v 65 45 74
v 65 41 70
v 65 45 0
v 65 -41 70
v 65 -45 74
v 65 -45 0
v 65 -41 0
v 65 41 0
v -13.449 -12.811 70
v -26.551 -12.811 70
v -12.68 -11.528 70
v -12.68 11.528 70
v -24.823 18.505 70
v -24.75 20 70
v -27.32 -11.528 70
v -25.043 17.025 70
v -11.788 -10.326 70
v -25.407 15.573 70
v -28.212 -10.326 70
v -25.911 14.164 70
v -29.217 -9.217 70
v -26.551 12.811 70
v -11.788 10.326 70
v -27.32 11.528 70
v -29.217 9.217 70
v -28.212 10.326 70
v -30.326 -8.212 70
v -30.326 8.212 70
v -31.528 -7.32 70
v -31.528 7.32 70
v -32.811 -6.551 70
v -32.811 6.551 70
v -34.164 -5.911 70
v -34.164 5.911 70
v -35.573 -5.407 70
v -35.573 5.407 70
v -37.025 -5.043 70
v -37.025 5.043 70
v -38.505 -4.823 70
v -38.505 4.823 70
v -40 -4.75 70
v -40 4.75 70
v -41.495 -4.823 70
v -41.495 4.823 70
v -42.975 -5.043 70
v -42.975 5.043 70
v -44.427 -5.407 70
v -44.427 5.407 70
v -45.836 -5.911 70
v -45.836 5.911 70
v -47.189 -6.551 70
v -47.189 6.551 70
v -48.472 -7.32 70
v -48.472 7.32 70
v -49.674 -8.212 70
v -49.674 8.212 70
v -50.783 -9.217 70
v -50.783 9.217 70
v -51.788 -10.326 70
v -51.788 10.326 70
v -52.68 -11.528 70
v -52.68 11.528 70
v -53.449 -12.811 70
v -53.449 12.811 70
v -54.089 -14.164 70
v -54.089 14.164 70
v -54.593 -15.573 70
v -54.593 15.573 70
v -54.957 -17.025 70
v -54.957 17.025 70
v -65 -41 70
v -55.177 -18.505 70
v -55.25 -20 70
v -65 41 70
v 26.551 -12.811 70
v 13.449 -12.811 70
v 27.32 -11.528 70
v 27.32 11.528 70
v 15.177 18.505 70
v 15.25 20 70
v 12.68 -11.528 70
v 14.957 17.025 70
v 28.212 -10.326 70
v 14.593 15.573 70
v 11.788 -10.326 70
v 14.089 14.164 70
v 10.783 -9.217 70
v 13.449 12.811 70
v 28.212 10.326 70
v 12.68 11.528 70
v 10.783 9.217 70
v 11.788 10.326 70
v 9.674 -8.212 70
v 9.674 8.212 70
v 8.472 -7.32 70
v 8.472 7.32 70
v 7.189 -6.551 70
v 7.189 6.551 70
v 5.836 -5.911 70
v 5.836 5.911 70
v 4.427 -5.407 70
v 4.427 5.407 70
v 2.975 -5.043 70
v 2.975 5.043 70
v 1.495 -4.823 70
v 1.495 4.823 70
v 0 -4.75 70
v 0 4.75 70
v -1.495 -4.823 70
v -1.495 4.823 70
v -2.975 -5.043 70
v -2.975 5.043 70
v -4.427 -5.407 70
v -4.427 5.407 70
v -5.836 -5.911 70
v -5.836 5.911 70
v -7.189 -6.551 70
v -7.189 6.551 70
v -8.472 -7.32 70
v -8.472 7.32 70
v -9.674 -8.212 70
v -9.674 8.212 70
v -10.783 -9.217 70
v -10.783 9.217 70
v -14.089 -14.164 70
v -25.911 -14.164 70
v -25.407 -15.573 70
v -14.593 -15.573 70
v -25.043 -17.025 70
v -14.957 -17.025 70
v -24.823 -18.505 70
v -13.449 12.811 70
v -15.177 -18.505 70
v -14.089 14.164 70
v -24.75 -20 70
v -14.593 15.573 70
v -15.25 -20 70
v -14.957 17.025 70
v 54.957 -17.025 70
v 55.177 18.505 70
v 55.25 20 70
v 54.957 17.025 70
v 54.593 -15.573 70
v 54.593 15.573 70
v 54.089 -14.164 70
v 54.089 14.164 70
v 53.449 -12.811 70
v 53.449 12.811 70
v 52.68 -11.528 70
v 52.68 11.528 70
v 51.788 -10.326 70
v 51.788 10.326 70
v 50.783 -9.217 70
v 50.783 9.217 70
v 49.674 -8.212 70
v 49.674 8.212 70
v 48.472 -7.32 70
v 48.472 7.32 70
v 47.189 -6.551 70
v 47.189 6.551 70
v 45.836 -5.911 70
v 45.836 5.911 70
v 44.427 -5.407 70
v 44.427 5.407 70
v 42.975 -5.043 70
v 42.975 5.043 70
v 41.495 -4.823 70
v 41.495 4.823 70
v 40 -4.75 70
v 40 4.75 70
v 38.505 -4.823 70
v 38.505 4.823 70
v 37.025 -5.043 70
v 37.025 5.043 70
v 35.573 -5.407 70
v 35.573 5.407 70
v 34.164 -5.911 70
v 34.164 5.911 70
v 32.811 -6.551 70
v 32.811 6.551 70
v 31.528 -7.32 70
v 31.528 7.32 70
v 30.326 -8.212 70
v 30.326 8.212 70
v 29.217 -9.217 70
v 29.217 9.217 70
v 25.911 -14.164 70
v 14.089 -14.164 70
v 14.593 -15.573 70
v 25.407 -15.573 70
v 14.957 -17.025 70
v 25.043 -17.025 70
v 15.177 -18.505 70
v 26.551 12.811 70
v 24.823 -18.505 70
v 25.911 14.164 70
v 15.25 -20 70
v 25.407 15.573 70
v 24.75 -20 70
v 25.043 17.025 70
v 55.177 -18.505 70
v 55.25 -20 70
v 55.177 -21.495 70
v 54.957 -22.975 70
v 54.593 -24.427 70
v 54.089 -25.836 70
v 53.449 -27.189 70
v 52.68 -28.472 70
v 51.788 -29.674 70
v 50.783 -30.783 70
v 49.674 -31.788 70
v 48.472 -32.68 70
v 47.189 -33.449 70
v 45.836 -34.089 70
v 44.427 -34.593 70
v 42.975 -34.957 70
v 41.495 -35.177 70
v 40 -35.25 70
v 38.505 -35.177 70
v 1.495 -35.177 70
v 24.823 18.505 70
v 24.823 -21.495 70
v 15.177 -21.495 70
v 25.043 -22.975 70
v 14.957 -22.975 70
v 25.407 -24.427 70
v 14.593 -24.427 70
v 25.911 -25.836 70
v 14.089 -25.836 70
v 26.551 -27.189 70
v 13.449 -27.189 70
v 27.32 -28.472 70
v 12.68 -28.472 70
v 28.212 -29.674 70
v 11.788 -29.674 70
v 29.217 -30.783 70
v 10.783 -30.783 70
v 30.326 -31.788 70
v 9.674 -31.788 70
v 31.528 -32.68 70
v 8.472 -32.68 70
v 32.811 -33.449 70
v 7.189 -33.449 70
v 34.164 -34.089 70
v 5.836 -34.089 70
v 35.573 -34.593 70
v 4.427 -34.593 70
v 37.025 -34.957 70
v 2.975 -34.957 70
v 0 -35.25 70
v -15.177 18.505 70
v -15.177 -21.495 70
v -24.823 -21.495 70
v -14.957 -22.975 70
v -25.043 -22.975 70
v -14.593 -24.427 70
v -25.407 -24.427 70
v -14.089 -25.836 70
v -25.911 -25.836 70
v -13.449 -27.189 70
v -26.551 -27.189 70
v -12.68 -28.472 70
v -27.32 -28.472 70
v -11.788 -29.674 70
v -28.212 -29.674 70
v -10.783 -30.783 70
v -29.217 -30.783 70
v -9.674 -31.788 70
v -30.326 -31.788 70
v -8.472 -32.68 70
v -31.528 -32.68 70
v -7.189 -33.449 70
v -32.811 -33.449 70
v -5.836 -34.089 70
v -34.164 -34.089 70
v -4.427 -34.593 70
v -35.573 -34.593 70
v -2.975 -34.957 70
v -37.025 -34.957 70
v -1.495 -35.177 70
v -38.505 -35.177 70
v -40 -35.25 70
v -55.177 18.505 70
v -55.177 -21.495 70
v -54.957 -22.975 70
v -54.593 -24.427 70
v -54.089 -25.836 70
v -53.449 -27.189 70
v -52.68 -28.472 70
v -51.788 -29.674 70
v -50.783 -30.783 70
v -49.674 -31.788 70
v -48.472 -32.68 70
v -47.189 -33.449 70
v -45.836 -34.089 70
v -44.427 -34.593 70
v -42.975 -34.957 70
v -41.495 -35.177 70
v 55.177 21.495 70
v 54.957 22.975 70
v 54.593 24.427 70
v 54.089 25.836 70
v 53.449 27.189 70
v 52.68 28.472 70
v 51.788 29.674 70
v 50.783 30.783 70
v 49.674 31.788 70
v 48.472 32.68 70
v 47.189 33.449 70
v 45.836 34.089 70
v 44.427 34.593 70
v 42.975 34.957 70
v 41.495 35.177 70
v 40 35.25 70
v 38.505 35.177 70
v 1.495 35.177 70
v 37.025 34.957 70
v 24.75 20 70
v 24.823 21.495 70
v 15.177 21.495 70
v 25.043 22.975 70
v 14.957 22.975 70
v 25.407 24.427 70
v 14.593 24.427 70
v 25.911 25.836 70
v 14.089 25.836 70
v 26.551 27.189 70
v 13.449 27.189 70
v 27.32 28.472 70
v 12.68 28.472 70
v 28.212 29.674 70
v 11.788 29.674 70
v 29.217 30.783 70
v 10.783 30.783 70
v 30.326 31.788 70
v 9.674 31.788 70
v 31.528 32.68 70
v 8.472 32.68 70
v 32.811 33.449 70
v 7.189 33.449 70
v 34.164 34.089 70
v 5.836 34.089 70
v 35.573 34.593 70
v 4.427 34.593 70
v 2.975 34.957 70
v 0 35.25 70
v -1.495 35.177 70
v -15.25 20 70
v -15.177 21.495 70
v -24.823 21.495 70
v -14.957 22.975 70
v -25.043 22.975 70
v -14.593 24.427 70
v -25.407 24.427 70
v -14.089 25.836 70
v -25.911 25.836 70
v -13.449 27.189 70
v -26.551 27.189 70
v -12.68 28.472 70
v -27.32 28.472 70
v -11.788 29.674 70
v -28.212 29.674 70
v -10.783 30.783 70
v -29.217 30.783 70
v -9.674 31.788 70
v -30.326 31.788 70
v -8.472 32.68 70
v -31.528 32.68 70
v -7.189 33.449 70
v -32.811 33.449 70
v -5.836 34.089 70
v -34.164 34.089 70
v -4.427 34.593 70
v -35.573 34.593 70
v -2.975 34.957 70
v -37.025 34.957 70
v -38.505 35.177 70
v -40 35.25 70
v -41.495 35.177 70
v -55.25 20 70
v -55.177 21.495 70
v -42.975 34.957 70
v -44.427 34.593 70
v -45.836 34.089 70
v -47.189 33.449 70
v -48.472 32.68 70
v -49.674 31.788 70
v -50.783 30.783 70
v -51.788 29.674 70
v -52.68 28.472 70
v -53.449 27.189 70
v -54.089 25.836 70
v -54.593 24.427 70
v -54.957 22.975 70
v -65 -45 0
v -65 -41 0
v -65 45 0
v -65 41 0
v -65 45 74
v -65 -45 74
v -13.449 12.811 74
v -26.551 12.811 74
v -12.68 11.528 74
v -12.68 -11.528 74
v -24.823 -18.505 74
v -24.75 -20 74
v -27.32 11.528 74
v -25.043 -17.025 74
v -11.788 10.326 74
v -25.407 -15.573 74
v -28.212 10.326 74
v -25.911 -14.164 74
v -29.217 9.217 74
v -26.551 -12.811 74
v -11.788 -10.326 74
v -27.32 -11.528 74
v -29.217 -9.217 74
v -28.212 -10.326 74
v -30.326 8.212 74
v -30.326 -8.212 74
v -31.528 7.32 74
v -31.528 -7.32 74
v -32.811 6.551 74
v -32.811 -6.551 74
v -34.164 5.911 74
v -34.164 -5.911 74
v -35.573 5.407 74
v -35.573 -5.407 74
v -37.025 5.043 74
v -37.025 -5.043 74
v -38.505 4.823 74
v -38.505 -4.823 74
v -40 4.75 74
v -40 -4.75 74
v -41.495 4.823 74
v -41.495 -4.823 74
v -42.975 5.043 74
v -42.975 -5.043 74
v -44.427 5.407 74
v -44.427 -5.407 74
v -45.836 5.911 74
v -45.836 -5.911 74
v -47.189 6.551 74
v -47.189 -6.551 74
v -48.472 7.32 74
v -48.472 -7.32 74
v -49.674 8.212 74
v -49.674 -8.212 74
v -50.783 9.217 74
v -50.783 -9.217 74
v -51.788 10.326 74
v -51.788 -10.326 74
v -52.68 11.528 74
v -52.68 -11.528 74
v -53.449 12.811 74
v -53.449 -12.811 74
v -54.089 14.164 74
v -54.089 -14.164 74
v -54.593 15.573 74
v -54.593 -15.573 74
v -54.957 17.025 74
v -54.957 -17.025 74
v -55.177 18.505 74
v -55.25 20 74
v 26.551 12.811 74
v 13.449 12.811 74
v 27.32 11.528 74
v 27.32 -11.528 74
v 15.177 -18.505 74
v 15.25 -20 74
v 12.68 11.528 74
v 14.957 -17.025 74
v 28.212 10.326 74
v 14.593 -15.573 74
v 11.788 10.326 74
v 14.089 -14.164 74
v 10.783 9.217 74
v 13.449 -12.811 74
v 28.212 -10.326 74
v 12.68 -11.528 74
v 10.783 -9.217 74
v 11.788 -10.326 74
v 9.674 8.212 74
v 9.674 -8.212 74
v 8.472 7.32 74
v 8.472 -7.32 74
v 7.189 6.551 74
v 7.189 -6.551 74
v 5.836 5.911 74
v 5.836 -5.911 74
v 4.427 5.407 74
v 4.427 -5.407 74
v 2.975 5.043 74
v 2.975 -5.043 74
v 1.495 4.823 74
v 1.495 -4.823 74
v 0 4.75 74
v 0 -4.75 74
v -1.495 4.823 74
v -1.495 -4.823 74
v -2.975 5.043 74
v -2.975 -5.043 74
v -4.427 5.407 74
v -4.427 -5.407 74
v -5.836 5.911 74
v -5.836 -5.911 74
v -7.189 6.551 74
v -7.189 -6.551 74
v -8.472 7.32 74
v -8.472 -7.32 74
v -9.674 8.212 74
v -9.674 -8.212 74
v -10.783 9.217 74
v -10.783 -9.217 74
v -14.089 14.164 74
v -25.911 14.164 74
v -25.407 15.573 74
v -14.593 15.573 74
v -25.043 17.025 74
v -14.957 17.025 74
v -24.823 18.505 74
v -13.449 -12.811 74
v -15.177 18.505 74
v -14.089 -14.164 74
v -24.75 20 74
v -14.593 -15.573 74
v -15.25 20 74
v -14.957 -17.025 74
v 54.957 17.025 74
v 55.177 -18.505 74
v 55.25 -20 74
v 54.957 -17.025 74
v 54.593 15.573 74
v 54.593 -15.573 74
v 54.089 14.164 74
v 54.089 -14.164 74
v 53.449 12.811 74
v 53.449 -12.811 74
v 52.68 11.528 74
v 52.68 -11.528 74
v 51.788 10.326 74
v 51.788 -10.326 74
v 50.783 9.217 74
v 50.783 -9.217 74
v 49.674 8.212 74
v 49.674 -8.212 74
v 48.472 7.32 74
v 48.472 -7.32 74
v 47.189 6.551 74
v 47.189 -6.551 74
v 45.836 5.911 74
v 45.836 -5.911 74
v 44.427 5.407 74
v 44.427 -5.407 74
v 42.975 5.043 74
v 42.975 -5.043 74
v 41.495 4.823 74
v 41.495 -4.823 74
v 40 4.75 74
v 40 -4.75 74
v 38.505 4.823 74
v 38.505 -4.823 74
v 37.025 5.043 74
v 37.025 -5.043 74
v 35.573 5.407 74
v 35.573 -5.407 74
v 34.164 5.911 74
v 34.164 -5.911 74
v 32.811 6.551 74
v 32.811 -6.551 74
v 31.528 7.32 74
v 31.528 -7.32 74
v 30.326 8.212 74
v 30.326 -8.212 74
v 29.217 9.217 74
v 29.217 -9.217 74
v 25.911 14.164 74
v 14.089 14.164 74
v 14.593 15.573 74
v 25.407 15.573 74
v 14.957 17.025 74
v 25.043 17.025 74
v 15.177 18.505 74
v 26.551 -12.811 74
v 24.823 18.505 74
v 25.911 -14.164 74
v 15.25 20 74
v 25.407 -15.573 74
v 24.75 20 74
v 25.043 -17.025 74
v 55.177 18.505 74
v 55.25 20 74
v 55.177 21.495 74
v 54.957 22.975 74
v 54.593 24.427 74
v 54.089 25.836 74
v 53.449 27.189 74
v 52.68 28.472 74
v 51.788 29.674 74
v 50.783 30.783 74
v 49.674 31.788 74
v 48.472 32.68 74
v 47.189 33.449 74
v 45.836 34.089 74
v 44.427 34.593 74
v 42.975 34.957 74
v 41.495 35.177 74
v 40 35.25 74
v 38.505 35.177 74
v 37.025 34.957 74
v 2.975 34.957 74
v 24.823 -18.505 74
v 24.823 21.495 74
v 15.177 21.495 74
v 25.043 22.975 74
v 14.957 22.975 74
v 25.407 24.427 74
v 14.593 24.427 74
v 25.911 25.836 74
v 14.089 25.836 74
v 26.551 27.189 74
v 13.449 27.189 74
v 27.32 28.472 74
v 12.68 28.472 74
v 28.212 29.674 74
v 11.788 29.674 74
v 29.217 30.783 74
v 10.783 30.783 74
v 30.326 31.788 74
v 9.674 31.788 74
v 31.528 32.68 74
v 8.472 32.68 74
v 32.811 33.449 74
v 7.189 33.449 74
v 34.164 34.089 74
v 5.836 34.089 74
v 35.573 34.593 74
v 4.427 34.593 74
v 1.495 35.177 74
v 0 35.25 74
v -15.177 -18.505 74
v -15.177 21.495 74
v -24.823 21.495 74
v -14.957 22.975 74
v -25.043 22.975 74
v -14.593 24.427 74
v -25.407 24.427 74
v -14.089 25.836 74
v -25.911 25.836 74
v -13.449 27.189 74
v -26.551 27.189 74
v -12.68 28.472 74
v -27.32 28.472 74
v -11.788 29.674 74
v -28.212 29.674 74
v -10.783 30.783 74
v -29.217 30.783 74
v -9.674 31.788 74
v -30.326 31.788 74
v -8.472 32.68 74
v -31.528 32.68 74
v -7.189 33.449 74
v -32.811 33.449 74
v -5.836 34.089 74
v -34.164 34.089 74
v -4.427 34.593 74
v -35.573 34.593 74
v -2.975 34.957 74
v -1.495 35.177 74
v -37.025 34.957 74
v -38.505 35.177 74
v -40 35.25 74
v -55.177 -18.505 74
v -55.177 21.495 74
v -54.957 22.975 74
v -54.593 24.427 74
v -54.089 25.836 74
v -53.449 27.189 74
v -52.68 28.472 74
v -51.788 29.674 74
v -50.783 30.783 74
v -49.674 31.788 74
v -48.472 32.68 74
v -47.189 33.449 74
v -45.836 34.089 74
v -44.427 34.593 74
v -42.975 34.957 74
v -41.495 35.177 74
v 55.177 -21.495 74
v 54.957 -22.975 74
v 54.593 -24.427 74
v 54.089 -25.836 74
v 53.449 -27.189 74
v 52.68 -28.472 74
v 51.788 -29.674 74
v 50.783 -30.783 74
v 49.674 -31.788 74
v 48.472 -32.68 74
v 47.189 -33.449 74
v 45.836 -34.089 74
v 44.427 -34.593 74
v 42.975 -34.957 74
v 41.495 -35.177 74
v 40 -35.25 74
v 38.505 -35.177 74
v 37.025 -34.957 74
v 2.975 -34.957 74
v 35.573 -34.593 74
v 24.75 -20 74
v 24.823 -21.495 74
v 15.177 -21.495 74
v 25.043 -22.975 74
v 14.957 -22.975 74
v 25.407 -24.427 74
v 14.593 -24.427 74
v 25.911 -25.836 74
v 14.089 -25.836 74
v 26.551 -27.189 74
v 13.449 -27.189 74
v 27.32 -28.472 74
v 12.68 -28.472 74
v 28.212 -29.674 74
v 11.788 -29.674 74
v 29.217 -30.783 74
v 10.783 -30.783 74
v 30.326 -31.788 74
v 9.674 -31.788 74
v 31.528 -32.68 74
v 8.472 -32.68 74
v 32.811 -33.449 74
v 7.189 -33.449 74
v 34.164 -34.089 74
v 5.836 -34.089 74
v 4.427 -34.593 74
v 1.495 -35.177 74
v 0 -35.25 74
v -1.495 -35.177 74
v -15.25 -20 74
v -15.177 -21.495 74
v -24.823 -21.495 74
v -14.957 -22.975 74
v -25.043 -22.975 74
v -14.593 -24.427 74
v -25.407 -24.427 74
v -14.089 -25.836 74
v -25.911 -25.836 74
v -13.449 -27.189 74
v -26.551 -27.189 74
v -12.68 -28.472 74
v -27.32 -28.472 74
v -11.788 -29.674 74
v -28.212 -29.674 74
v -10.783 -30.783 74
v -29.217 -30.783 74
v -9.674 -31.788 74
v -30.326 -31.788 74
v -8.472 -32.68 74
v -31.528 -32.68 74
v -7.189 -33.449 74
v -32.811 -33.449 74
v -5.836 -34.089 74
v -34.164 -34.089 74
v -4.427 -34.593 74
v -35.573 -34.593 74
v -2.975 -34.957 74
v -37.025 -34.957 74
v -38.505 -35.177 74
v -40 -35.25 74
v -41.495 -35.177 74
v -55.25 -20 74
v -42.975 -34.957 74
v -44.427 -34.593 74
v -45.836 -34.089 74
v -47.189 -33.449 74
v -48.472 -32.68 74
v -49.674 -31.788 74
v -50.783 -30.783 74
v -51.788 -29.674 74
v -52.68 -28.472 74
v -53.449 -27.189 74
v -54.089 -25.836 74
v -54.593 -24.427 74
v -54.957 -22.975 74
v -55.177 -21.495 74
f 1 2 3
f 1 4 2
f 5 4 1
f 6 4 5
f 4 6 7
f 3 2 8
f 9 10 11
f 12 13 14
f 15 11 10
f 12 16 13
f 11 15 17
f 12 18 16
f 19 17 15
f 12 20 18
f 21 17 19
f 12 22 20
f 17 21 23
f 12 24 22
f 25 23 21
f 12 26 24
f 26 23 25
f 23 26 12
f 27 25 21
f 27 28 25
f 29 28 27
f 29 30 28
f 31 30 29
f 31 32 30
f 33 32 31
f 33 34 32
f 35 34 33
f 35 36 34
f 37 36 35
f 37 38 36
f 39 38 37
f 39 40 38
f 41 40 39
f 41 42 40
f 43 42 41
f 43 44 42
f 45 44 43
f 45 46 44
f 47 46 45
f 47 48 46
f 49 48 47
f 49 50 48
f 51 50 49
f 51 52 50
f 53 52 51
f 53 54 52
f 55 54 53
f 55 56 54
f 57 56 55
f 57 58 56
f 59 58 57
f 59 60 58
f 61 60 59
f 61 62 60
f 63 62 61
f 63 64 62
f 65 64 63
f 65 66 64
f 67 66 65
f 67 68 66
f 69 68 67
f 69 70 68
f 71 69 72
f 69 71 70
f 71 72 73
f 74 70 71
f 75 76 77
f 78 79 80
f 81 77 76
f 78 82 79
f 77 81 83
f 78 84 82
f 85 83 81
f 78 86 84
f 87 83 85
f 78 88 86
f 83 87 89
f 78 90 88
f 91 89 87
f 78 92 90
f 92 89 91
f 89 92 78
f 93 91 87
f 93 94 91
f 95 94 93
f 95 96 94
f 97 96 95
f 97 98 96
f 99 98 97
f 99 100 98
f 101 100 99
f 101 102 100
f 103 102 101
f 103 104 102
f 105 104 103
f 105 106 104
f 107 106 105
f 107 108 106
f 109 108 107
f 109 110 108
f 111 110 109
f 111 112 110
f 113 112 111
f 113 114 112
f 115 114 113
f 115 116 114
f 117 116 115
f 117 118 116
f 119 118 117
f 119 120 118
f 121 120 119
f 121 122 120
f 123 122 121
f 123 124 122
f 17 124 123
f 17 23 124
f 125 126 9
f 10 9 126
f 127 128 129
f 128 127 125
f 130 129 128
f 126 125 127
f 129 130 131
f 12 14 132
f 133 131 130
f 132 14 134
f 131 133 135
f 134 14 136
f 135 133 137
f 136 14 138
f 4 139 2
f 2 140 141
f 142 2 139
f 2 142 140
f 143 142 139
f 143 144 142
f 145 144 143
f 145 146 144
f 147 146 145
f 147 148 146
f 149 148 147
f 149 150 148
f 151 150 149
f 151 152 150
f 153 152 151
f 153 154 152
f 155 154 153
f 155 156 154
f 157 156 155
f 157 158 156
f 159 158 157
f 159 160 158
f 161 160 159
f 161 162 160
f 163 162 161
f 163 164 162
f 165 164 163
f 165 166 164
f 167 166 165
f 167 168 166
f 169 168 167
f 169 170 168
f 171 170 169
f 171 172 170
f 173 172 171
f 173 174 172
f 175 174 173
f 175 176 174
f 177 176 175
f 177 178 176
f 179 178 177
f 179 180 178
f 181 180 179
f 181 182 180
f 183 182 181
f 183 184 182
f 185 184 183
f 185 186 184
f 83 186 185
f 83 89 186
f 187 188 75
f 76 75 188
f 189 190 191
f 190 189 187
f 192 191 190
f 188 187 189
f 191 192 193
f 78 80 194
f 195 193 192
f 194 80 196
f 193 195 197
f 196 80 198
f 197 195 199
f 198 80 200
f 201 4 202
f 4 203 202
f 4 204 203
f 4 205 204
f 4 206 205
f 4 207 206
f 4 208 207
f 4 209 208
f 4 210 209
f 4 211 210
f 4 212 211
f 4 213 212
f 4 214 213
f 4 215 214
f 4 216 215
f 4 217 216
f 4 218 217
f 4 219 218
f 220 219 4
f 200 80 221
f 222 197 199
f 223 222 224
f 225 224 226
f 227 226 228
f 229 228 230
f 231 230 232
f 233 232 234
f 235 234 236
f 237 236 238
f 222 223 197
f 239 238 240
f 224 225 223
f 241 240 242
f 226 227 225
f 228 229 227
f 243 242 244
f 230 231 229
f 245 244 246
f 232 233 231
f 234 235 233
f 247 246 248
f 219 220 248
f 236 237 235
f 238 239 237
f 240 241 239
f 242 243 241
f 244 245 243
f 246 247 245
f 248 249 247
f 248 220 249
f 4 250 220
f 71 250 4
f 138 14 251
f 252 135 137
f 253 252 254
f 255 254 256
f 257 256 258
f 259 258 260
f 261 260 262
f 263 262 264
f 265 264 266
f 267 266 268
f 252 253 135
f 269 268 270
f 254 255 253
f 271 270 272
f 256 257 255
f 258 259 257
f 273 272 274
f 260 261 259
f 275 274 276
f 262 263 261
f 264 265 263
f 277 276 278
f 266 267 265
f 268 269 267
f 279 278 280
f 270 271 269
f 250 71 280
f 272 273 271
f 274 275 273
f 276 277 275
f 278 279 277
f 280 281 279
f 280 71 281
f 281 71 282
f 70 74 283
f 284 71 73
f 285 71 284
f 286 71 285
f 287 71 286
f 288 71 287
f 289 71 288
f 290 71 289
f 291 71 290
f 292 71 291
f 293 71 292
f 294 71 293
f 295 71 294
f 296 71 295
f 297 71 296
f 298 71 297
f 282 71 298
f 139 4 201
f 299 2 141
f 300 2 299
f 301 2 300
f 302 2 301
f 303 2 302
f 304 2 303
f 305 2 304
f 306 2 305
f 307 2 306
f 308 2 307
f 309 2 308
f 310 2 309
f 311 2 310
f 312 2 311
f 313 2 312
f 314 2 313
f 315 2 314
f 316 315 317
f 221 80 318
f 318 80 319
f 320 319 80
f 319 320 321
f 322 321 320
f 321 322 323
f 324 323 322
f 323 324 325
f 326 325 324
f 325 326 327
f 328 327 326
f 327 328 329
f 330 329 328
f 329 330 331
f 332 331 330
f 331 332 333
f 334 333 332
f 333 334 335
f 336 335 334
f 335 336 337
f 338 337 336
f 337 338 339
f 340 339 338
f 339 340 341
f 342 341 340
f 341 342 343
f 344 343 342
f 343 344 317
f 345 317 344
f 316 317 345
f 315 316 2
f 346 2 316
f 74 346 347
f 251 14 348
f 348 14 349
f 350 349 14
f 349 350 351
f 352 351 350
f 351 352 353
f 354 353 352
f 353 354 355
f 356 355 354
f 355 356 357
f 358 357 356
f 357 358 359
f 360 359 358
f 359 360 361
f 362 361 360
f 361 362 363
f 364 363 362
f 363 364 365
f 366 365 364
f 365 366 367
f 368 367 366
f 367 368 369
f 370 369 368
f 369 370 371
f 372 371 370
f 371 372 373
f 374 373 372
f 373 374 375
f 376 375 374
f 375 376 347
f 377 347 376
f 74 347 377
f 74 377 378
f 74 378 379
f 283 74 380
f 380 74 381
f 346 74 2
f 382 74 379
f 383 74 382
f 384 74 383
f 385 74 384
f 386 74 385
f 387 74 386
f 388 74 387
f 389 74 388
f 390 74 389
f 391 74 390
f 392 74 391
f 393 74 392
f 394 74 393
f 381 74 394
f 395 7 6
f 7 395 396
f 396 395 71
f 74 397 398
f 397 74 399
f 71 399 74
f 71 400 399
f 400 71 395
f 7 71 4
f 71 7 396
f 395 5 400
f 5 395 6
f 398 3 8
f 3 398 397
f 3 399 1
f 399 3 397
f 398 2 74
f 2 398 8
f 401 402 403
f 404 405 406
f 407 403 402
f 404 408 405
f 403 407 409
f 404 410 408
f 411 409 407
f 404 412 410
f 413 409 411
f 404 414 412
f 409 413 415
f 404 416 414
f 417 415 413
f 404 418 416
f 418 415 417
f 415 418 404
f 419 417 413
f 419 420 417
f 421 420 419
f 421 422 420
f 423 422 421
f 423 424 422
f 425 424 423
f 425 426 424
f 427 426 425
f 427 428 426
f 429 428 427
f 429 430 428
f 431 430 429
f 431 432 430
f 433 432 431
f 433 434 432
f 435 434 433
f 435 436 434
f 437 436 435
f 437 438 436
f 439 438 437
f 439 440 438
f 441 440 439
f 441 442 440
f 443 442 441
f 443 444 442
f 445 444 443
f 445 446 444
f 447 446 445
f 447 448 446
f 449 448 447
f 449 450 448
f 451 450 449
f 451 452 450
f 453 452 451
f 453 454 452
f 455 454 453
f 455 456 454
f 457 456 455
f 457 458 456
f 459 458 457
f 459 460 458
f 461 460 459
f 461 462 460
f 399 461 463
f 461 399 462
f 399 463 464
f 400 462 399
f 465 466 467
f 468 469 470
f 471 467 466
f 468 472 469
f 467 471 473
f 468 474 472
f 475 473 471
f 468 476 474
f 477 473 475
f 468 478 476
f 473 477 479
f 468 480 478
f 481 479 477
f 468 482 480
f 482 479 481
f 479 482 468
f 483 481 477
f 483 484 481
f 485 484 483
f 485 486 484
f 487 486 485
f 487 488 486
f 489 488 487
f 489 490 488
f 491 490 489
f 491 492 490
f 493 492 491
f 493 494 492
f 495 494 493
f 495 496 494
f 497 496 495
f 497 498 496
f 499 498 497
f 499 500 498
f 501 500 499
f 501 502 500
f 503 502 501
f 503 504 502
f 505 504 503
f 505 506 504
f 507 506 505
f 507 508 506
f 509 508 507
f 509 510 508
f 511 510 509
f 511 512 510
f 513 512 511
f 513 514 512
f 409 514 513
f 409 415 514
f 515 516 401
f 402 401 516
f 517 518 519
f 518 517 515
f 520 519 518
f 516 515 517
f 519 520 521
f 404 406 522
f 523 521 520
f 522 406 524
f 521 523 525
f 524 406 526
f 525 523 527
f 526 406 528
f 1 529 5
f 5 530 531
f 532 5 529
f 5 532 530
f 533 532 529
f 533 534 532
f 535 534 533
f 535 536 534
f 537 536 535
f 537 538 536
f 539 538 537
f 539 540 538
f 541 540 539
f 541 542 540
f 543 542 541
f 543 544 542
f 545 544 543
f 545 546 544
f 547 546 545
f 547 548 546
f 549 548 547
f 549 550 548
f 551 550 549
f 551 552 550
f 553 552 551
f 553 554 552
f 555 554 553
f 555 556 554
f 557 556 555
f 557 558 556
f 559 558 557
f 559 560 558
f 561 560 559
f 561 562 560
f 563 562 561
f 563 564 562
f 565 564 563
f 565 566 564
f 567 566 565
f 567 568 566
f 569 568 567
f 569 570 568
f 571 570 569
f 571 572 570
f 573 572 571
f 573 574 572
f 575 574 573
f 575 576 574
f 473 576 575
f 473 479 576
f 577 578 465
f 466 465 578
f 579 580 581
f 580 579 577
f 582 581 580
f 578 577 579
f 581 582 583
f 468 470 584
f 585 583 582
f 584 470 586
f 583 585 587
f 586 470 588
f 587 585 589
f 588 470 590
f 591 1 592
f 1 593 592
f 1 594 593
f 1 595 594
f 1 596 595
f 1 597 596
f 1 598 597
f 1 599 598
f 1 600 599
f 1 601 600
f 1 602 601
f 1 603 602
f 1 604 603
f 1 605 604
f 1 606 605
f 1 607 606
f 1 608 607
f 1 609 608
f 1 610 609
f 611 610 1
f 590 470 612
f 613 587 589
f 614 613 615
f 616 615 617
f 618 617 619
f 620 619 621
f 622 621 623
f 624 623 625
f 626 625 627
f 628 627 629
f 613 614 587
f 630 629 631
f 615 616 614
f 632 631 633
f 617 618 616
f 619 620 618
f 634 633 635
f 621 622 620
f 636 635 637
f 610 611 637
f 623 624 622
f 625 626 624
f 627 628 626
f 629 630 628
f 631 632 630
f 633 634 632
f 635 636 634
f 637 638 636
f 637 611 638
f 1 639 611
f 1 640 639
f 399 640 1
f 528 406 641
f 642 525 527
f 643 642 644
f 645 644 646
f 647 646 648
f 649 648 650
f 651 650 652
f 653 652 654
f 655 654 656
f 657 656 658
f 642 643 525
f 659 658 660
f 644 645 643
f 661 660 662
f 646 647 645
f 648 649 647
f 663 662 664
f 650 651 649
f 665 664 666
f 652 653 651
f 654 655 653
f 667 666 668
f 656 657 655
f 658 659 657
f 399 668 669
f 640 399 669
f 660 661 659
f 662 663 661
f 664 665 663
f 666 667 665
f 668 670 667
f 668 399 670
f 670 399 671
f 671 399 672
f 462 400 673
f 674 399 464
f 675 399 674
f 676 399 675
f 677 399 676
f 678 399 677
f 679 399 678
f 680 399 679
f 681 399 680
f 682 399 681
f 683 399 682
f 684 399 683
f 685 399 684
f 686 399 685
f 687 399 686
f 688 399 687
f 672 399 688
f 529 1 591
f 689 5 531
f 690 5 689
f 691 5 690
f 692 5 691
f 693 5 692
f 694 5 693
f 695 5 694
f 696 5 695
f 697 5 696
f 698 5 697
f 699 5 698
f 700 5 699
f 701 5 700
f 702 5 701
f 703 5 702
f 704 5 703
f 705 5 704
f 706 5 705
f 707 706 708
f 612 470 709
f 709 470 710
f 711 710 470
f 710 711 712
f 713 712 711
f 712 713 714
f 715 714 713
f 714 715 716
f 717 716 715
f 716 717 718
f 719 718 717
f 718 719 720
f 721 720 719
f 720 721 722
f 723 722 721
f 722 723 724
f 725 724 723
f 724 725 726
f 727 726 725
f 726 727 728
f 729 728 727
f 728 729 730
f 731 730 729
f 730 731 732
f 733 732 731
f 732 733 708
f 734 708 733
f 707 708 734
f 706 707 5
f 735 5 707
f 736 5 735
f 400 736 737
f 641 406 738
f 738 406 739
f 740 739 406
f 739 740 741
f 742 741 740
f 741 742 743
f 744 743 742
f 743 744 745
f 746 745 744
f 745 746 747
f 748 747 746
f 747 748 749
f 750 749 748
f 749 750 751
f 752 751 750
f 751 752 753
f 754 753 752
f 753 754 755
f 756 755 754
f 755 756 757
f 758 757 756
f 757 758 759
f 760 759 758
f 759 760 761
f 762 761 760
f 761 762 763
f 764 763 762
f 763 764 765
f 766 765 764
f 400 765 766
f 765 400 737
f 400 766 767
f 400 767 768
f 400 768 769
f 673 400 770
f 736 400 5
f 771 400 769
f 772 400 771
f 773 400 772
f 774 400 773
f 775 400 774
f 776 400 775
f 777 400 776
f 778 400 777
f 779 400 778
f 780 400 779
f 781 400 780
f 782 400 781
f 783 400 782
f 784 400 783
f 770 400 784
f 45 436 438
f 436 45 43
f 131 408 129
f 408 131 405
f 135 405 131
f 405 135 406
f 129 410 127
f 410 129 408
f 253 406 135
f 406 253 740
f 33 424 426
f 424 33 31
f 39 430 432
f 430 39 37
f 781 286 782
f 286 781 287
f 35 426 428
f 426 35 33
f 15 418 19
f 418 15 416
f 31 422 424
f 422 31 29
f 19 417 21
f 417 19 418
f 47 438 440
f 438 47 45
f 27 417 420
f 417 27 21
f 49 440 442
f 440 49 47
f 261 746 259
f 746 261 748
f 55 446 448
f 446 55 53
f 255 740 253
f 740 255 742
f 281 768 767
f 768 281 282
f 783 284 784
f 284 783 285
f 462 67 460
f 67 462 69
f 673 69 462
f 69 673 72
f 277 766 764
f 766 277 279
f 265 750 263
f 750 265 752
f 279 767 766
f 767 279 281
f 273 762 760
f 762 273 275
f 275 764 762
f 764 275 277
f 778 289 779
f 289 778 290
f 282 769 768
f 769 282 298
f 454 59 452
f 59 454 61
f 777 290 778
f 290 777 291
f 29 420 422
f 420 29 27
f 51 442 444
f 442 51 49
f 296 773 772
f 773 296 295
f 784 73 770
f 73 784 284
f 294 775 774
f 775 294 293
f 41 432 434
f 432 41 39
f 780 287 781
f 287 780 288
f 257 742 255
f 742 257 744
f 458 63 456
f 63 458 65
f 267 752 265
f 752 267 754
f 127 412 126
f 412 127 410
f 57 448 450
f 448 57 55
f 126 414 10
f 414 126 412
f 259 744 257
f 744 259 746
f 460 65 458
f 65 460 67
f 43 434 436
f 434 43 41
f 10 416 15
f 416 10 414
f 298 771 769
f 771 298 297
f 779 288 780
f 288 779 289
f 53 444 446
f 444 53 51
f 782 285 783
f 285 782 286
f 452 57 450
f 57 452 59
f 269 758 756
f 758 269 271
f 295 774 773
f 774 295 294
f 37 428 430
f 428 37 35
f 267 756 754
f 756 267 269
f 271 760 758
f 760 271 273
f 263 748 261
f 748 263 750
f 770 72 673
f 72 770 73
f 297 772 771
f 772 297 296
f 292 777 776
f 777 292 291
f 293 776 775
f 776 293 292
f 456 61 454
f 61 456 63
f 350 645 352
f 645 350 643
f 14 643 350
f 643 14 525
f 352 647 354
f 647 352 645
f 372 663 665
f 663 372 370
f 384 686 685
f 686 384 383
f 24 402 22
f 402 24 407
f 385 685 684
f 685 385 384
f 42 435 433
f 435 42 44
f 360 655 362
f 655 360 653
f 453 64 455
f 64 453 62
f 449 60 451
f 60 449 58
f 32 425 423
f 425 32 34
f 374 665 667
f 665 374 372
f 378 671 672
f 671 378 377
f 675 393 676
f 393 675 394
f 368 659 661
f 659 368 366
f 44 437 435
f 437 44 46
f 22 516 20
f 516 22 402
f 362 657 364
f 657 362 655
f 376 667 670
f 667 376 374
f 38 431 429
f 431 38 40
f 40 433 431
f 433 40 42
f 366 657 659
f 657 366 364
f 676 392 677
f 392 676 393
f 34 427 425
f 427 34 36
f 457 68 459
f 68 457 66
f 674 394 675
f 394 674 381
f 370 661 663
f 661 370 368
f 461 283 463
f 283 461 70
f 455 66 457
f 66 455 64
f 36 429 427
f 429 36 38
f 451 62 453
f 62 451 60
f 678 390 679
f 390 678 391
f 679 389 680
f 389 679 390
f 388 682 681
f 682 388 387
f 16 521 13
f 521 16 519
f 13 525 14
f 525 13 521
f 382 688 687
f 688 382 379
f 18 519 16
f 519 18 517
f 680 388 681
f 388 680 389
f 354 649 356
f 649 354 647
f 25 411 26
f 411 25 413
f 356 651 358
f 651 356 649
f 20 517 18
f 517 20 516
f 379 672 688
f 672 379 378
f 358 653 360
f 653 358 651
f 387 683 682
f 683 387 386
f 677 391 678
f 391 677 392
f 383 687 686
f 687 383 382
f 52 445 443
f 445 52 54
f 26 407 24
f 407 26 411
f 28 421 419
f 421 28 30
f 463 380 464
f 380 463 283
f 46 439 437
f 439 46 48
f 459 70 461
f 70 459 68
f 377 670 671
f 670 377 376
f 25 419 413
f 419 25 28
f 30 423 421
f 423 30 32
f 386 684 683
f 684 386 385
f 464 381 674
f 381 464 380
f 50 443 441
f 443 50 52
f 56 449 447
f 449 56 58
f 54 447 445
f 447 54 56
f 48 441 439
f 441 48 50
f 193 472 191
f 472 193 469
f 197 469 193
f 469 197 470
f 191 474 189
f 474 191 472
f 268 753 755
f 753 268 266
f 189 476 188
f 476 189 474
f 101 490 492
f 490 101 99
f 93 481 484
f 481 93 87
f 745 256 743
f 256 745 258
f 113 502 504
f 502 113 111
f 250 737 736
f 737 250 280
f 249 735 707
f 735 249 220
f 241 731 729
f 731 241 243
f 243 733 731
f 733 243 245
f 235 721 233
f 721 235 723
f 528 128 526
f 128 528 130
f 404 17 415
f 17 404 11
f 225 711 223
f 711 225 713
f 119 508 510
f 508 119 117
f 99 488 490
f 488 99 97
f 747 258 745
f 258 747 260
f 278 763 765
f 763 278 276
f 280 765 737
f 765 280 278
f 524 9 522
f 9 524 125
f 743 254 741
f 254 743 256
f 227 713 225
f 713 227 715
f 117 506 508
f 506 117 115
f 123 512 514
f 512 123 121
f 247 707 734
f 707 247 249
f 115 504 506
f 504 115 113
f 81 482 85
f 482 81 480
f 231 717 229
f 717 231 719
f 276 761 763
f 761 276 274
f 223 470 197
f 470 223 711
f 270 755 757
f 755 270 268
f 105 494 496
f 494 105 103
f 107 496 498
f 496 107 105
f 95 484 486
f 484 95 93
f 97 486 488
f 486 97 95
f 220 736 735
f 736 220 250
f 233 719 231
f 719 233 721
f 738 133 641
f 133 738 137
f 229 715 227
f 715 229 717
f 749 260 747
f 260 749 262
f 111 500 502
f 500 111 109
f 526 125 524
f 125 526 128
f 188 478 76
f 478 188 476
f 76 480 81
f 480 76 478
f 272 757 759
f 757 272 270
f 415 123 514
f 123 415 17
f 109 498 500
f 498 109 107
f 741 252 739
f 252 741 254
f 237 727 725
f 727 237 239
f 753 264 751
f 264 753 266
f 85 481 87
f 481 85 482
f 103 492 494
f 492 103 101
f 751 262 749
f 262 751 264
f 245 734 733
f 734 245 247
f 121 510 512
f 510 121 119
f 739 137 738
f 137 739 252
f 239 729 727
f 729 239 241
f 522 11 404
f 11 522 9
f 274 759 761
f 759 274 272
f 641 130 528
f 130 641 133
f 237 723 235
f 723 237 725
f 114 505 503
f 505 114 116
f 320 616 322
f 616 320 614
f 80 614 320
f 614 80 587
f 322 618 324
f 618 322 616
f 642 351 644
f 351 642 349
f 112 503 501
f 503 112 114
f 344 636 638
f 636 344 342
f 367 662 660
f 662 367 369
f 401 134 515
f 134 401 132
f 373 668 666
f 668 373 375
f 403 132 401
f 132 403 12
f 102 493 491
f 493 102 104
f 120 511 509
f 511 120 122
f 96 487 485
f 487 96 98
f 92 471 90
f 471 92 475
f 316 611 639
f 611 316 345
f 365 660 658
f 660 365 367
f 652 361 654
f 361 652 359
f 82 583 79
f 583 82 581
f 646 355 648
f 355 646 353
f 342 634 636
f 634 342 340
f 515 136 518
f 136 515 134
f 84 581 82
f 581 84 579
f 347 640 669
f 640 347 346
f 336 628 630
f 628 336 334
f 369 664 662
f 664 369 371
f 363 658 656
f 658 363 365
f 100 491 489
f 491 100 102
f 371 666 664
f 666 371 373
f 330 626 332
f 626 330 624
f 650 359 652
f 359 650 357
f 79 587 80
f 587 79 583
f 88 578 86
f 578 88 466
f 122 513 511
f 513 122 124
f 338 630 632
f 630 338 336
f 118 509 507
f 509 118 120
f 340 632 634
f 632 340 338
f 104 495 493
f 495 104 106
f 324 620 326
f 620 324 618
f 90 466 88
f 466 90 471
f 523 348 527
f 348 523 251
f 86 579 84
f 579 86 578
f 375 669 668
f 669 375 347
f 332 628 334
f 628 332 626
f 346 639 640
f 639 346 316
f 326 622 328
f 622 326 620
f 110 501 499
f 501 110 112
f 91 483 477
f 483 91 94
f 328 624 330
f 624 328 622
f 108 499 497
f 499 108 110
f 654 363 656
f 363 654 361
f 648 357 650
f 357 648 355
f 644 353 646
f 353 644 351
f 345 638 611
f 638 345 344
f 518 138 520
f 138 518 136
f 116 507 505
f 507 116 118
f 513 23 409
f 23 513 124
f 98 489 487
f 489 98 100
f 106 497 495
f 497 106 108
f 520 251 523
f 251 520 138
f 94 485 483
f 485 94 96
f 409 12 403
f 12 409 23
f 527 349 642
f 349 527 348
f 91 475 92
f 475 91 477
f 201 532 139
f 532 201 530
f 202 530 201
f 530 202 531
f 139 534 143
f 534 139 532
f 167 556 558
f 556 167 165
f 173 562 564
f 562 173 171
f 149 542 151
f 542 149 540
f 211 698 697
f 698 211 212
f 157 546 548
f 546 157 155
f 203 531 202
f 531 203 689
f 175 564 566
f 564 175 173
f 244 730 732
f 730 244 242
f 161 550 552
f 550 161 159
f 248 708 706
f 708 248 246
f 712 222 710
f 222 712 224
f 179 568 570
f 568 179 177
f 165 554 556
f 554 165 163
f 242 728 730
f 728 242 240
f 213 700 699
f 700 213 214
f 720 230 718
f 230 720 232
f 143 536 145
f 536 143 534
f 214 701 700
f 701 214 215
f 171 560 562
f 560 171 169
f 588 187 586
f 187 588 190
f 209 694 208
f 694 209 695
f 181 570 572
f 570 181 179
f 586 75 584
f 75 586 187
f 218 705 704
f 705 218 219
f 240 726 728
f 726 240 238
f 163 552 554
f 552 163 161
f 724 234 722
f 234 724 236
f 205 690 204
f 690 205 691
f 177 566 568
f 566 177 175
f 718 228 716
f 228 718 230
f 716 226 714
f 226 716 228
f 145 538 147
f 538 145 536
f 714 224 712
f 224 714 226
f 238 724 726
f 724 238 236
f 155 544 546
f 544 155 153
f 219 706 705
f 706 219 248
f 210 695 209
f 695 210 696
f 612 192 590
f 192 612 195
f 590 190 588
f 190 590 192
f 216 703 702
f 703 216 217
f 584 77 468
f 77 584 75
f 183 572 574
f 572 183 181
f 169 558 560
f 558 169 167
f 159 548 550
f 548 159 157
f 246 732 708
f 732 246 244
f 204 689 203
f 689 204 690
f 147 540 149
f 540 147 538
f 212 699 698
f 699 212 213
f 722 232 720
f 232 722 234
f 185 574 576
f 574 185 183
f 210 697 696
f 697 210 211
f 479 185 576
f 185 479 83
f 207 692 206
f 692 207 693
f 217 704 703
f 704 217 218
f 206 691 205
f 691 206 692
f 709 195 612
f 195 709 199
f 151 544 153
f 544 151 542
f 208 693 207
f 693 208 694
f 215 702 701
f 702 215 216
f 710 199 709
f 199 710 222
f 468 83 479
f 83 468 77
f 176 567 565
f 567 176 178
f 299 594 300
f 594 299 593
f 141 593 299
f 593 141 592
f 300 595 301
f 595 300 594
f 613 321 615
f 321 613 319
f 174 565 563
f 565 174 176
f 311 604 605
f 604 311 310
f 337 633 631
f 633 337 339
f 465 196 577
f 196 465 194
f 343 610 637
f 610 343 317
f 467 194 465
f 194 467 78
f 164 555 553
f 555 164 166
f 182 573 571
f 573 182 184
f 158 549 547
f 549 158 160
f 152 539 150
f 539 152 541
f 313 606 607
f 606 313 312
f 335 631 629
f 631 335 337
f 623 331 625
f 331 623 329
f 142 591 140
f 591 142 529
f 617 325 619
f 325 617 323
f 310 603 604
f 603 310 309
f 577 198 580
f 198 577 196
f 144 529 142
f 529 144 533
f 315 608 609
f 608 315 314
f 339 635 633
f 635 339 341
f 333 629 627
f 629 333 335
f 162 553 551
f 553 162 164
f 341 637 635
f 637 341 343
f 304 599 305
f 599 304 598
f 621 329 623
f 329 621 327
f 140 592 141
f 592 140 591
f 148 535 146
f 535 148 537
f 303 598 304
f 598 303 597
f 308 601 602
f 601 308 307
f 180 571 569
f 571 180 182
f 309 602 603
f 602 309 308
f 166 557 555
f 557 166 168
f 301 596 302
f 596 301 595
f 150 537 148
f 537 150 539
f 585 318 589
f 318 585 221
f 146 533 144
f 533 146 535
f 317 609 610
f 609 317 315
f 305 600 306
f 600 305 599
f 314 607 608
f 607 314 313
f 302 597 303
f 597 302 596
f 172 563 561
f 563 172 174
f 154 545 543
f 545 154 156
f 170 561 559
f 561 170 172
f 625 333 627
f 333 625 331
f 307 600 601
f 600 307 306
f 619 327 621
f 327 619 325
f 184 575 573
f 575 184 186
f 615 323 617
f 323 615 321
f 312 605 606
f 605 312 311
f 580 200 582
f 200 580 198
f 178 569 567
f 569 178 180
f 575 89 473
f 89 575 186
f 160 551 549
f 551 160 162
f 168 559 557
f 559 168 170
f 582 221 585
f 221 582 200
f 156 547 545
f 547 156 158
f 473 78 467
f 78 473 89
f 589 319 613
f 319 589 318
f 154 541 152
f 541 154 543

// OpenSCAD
// Rack for six 50 mL conical tubes.
// Print orientation: Walls on bed (z=0), plate at top.
// After printing, flip over so walls are on the bed and tubes hang down.

// Plate dimensions
L     = 130; // Length (X)
W     = 90;  // Width (Y)
t     = 4;   // Plate thickness (Z)

// Tube hole dimensions
n_rows = 2; // Rows along Y
n_cols = 3; // Columns along X
hole_d = 30.5; // Hole diameter
pitch_x = 40; // Centre-to-centre spacing X
pitch_y = 40; // Centre-to-centre spacing Y

// Wall dimensions
wall_h = 70; // Wall height from plate top (total height = wall_h + t)
wall_t = 4;  // Wall thickness (Y)

// Geometry parameters
$fn = 64;

// Main body: Walls + Plate
difference() {
    union() {
        // 1. Two solid walls along the long edges (X axis), sitting on the bed (z=0)
        // Left wall (at Y = -W/2)
        translate([-L / 2, -W / 2, 0]) 
            cube([L, wall_t, wall_h]);
        
        // Right wall (at Y = +W/2)
        translate([-L / 2, W / 2 - wall_t, 0]) 
            cube([L, wall_t, wall_h]);

        // 2. The flat plate sitting on top of the walls
        translate([-L / 2, -W / 2, wall_h]) 
            cube([L, W, t]);
    }

    // Cut out the six tube holes
    // Holes go through the entire assembly (walls + plate)
    for (i = [0 : n_cols - 1]) {
        for (j = [0 : n_rows - 1]) {
            // Calculate X position: centered on plate, spaced by pitch_x
            // i=0 -> -pitch_x, i=1 -> 0, i=2 -> +pitch_x
            x_pos = (i - (n_cols - 1) / 2) * pitch_x;
            
            // Calculate Y position: centered on plate, spaced by pitch_y
            // j=0 -> -pitch_y/2, j=1 -> +pitch_y/2
            y_pos = (j - (n_rows - 1) / 2) * pitch_y;
            
            translate([x_pos, y_pos, 0]) 
                cylinder(h = wall_h + t + 1, d = hole_d); // Extend slightly past total height
        }
    }
}
